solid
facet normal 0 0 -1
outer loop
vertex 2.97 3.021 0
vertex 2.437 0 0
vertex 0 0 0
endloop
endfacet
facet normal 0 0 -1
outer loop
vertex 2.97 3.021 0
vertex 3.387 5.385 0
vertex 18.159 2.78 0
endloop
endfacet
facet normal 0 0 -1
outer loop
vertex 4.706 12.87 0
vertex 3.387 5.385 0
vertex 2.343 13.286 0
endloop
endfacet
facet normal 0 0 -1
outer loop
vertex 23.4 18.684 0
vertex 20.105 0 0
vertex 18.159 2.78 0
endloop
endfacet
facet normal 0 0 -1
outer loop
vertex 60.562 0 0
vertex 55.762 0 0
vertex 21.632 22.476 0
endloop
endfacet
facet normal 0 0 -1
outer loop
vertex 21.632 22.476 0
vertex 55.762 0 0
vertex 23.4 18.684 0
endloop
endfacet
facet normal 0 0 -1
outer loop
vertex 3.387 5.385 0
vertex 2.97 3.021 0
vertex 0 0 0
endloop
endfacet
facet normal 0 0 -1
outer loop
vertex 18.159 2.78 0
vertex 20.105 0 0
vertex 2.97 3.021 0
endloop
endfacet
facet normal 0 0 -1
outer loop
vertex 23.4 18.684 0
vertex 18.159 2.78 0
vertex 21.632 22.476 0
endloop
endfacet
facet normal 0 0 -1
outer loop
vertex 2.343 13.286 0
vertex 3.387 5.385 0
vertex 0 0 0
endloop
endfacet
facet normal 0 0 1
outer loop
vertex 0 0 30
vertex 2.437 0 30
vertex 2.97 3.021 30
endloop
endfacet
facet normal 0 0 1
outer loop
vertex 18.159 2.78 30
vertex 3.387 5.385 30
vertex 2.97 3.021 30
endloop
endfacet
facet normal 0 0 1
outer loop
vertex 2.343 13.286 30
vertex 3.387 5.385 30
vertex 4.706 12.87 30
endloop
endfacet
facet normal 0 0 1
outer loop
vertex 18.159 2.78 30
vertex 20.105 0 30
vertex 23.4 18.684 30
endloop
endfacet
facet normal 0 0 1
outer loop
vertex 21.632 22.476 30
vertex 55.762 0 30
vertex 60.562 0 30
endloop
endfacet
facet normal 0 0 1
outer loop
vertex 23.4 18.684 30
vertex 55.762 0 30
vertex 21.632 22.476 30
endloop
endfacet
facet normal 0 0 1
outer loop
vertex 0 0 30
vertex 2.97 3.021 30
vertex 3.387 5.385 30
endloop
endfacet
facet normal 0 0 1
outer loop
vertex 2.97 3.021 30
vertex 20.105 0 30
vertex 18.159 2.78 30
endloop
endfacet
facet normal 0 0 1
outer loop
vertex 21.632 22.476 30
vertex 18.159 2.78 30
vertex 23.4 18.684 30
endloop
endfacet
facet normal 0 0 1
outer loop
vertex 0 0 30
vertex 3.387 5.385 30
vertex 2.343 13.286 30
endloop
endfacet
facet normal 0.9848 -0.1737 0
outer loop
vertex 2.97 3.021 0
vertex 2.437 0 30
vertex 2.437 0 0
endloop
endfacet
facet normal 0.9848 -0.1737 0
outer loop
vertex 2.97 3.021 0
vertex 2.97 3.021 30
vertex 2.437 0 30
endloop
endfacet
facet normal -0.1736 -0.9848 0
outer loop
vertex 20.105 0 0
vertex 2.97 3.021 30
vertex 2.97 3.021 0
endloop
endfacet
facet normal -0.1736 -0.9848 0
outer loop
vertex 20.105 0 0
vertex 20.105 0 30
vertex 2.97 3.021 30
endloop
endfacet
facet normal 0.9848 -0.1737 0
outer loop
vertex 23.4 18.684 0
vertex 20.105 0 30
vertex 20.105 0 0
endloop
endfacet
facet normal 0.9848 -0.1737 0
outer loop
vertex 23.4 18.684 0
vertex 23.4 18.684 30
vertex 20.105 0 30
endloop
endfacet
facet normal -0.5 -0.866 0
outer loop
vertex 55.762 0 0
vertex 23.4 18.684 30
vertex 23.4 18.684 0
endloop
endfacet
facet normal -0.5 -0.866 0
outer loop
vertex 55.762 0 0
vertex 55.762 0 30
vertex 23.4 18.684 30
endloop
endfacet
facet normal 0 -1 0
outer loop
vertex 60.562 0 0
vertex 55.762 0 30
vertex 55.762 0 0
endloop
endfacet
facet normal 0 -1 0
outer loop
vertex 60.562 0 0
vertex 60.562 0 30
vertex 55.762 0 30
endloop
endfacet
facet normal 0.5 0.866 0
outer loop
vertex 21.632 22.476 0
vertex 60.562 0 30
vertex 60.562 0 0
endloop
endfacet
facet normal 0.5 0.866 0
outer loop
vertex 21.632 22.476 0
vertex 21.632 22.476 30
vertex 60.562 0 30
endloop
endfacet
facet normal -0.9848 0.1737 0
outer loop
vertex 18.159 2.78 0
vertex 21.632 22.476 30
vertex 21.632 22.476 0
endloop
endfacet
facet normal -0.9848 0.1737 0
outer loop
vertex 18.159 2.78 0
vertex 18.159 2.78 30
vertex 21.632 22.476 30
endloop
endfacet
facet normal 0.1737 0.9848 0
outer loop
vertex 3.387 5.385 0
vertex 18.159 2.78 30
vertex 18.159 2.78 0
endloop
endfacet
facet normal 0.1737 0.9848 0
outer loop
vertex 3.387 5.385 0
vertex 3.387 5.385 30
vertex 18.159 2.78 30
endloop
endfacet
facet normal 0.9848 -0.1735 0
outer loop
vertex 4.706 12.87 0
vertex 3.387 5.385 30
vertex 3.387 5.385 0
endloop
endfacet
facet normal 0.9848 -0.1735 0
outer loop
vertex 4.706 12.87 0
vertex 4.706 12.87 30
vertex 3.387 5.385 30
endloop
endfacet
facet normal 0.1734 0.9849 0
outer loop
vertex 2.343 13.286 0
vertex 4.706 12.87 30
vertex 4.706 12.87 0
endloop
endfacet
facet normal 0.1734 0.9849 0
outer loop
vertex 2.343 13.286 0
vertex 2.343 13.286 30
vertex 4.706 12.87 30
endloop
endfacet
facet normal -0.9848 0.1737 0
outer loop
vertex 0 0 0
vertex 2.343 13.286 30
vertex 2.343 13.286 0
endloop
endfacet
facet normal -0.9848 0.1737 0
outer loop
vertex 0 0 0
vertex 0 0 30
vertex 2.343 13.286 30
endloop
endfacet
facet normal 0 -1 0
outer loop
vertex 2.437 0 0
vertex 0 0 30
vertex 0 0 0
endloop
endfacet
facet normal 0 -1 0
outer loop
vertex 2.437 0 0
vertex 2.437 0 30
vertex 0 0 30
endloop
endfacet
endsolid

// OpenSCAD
t=0.6*4;
a=10;
af=60;
h=20;
s=10;
w=15;


module simple_squares() {
    linear_extrude(100)
    intersection() {

        translate([-50, 0])
        square([100, 100]);

        rotate(-a) {
            translate([-w-t*2,-50])
            square([t,s+t+50]);

            translate([-w-t*2,0])
            square([w+t*2, t]);

            translate([-t,0])
            square([t, t+h]);

            translate([0,t+h])
            rotate(a+af)
            translate([-t,-100])
            square([t, 100]);
        }
        
    }
}

function v(l, a) = [l*cos(a),l*sin(a)];

ab=h+t+t*tan(a);
ed=t/cos(af);
fe=ab*(sin(a)+cos(a)*tan(af))-t/cos(a)-ed;

f=[w+2*t,0];
g=f+[0,fe*cos(af)/sin(a+af)];
e=g+v(fe*cos(a)/sin(a+af), 270+a+af);
d=e+v(ed, a);

linear_extrude(30)
rotate(-a)
translate([0,(2*t+w)*tan(a)])
polygon([
    [w+t, h+t],
    [w+t, t],
    [t, t],
    [t, s],
    [0,s],
    [0,-(2*t+w)*tan(a)],
    [t,-(t+w)*tan(a)],
    [t,0],
    f,
    g,
    e,
    d
]);
